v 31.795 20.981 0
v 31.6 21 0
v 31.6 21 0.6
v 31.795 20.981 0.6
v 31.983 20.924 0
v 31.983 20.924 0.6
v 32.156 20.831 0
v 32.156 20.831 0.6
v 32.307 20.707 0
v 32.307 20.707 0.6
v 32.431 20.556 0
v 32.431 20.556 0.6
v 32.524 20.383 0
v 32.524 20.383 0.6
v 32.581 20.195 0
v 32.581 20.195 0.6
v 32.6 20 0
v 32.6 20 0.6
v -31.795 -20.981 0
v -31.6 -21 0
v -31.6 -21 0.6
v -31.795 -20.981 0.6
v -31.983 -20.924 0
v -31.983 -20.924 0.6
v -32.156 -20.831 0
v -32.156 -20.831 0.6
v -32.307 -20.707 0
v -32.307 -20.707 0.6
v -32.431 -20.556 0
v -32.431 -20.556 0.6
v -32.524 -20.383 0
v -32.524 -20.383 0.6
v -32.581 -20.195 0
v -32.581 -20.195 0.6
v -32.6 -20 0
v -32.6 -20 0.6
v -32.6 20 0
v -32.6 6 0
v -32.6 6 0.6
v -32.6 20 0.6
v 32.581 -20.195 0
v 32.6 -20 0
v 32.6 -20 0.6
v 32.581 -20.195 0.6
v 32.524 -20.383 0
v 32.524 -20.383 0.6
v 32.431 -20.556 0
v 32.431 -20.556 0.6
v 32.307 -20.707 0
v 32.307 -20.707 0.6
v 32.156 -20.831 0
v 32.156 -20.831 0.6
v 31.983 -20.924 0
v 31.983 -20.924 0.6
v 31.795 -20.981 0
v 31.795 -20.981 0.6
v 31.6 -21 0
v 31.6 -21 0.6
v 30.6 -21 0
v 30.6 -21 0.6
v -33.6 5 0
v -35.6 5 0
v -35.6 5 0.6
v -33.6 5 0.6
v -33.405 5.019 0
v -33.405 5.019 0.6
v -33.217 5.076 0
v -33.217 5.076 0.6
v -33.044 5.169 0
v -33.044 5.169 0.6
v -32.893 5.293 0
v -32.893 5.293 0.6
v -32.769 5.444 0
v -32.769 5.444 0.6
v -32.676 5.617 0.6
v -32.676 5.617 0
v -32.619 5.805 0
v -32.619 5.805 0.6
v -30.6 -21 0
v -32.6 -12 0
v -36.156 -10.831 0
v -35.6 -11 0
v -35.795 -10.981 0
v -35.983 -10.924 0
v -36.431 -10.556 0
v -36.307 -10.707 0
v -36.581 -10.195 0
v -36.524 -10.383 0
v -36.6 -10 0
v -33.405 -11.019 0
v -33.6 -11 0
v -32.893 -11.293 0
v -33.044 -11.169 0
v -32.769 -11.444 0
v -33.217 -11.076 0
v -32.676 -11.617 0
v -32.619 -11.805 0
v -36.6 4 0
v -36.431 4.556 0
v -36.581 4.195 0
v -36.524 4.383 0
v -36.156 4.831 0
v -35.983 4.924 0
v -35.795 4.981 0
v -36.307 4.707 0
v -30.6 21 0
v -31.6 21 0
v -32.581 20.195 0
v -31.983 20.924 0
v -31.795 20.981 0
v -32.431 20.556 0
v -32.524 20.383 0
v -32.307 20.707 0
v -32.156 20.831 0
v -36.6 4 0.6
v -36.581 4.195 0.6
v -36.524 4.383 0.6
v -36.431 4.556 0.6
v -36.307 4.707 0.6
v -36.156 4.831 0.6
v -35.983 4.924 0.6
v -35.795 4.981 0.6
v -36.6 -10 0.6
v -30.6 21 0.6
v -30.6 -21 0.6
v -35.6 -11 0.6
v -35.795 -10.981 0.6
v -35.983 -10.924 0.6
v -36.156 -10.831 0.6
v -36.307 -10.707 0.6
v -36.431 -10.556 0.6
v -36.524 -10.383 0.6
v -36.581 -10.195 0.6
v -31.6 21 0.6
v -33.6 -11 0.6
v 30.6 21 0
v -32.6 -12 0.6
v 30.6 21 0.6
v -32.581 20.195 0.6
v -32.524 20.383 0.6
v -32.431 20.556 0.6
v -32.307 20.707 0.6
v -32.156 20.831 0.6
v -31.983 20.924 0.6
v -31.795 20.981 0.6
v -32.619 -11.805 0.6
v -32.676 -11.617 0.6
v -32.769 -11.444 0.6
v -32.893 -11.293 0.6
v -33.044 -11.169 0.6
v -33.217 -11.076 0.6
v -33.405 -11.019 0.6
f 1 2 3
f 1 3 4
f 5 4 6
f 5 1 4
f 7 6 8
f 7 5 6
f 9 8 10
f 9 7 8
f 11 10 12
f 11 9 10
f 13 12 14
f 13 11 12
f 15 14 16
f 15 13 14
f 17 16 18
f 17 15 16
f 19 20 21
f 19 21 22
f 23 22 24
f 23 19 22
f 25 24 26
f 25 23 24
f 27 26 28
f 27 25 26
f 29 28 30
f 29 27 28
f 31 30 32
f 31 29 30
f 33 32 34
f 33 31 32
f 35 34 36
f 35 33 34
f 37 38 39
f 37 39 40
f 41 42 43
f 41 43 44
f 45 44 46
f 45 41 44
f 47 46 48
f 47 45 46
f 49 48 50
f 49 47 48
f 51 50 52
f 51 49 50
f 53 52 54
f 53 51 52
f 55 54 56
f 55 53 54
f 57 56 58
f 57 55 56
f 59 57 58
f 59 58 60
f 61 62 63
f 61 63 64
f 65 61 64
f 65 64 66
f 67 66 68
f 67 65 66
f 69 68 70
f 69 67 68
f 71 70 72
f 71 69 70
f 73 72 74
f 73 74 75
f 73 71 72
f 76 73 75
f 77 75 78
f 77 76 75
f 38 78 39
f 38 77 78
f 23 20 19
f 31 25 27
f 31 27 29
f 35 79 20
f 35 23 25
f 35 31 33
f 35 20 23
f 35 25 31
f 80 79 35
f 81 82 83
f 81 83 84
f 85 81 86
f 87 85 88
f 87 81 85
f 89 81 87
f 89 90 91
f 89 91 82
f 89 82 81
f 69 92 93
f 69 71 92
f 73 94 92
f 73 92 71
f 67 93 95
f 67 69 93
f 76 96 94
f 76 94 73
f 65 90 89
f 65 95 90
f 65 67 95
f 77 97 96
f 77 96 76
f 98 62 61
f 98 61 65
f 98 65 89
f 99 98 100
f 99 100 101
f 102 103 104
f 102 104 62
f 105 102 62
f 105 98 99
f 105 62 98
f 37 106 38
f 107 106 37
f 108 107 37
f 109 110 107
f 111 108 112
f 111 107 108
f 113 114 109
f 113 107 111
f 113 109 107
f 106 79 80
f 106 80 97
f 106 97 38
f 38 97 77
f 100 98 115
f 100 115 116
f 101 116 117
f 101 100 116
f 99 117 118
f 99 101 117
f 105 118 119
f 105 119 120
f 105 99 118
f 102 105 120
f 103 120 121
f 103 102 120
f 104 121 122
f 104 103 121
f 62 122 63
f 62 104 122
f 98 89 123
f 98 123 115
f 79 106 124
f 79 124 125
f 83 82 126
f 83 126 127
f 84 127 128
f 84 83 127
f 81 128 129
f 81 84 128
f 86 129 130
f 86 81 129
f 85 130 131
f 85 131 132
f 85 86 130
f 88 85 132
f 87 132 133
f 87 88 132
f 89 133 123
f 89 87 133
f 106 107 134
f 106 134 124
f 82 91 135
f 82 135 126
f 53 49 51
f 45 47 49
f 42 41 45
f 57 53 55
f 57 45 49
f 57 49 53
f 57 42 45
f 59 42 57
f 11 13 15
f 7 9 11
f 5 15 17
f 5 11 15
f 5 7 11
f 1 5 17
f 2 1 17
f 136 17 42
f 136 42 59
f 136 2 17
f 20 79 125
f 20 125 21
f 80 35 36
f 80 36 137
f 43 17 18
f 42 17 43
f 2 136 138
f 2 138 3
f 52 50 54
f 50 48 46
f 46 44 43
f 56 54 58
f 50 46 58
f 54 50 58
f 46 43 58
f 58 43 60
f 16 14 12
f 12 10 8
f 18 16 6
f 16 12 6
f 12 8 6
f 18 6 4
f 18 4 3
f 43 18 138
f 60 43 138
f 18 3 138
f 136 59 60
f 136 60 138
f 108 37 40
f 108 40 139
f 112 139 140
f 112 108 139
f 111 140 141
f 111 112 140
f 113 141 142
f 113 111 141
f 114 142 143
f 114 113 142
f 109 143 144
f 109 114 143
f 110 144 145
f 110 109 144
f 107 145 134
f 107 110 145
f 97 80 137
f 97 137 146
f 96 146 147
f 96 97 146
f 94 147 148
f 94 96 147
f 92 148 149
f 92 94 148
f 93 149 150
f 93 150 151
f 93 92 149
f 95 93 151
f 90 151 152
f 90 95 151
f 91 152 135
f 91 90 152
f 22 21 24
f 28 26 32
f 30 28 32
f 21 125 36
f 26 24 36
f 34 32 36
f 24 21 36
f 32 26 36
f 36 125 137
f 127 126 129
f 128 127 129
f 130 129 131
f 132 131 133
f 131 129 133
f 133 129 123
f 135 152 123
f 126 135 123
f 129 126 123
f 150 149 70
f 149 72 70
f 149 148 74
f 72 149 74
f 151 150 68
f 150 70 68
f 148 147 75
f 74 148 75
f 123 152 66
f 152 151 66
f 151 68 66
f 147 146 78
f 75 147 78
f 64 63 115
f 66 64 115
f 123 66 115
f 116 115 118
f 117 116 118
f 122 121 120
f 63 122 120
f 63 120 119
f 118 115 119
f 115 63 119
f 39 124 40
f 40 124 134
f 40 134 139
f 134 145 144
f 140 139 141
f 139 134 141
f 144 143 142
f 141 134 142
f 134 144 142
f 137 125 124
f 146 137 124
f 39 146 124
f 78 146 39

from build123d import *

# Parameters (mm, degrees)
EXTRUDE_1_DEPTH   = 0.6
EXTRUDE_1_2_DEPTH = 0.6


with BuildPart() as part:
    # Эскиз1 → Бобышка-Вытянуть1 (new body)
    with BuildSketch(Plane.XY):
        with BuildLine():
            Line((-30.6, -21), (-31.6, -21))
            ThreePointArc((-31.6, -21), (-32.307106781, -20.707106781), (-32.6, -20))
            Line((-32.6, -20), (-32.6, -12))
            ThreePointArc((-32.6, -12), (-32.892893219, -11.292893219), (-33.6, -11))
            Line((-33.6, -11), (-35.6, -11))
            ThreePointArc((-35.6, -11), (-36.307106781, -10.707106781), (-36.6, -10))
            Line((-36.6, -10), (-36.6, 4))
            ThreePointArc((-36.6, 4), (-36.307106781, 4.707106781), (-35.6, 5))
            Line((-35.6, 5), (-33.6, 5))
            ThreePointArc((-33.6, 5), (-32.892893219, 5.292893219), (-32.6, 6))
            Line((-32.6, 6), (-32.6, 20))
            ThreePointArc((-32.6, 20), (-32.307106781, 20.707106781), (-31.6, 21))
            Line((-31.6, 21), (-30.6, 21))
            Line((-30.6, 21), (-30.6, -21))
        make_face()
    extrude(amount=EXTRUDE_1_DEPTH)


with BuildPart() as body_2:
    # Эскиз1 → Extrude 1 2 (new body)
    with BuildSketch(Plane.XY):
        with BuildLine():
            Line((30.6, 21), (31.6, 21))
            ThreePointArc((31.6, 21), (32.307106781, 20.707106781), (32.6, 20))
            Line((32.6, 20), (32.6, -20))
            ThreePointArc((32.6, -20), (32.307106781, -20.707106781), (31.6, -21))
            Line((31.6, -21), (30.6, -21))
            Line((30.6, -21), (30.6, 21))
        make_face()
    extrude(amount=EXTRUDE_1_2_DEPTH)


solid = Compound([part.part, body_2.part])
